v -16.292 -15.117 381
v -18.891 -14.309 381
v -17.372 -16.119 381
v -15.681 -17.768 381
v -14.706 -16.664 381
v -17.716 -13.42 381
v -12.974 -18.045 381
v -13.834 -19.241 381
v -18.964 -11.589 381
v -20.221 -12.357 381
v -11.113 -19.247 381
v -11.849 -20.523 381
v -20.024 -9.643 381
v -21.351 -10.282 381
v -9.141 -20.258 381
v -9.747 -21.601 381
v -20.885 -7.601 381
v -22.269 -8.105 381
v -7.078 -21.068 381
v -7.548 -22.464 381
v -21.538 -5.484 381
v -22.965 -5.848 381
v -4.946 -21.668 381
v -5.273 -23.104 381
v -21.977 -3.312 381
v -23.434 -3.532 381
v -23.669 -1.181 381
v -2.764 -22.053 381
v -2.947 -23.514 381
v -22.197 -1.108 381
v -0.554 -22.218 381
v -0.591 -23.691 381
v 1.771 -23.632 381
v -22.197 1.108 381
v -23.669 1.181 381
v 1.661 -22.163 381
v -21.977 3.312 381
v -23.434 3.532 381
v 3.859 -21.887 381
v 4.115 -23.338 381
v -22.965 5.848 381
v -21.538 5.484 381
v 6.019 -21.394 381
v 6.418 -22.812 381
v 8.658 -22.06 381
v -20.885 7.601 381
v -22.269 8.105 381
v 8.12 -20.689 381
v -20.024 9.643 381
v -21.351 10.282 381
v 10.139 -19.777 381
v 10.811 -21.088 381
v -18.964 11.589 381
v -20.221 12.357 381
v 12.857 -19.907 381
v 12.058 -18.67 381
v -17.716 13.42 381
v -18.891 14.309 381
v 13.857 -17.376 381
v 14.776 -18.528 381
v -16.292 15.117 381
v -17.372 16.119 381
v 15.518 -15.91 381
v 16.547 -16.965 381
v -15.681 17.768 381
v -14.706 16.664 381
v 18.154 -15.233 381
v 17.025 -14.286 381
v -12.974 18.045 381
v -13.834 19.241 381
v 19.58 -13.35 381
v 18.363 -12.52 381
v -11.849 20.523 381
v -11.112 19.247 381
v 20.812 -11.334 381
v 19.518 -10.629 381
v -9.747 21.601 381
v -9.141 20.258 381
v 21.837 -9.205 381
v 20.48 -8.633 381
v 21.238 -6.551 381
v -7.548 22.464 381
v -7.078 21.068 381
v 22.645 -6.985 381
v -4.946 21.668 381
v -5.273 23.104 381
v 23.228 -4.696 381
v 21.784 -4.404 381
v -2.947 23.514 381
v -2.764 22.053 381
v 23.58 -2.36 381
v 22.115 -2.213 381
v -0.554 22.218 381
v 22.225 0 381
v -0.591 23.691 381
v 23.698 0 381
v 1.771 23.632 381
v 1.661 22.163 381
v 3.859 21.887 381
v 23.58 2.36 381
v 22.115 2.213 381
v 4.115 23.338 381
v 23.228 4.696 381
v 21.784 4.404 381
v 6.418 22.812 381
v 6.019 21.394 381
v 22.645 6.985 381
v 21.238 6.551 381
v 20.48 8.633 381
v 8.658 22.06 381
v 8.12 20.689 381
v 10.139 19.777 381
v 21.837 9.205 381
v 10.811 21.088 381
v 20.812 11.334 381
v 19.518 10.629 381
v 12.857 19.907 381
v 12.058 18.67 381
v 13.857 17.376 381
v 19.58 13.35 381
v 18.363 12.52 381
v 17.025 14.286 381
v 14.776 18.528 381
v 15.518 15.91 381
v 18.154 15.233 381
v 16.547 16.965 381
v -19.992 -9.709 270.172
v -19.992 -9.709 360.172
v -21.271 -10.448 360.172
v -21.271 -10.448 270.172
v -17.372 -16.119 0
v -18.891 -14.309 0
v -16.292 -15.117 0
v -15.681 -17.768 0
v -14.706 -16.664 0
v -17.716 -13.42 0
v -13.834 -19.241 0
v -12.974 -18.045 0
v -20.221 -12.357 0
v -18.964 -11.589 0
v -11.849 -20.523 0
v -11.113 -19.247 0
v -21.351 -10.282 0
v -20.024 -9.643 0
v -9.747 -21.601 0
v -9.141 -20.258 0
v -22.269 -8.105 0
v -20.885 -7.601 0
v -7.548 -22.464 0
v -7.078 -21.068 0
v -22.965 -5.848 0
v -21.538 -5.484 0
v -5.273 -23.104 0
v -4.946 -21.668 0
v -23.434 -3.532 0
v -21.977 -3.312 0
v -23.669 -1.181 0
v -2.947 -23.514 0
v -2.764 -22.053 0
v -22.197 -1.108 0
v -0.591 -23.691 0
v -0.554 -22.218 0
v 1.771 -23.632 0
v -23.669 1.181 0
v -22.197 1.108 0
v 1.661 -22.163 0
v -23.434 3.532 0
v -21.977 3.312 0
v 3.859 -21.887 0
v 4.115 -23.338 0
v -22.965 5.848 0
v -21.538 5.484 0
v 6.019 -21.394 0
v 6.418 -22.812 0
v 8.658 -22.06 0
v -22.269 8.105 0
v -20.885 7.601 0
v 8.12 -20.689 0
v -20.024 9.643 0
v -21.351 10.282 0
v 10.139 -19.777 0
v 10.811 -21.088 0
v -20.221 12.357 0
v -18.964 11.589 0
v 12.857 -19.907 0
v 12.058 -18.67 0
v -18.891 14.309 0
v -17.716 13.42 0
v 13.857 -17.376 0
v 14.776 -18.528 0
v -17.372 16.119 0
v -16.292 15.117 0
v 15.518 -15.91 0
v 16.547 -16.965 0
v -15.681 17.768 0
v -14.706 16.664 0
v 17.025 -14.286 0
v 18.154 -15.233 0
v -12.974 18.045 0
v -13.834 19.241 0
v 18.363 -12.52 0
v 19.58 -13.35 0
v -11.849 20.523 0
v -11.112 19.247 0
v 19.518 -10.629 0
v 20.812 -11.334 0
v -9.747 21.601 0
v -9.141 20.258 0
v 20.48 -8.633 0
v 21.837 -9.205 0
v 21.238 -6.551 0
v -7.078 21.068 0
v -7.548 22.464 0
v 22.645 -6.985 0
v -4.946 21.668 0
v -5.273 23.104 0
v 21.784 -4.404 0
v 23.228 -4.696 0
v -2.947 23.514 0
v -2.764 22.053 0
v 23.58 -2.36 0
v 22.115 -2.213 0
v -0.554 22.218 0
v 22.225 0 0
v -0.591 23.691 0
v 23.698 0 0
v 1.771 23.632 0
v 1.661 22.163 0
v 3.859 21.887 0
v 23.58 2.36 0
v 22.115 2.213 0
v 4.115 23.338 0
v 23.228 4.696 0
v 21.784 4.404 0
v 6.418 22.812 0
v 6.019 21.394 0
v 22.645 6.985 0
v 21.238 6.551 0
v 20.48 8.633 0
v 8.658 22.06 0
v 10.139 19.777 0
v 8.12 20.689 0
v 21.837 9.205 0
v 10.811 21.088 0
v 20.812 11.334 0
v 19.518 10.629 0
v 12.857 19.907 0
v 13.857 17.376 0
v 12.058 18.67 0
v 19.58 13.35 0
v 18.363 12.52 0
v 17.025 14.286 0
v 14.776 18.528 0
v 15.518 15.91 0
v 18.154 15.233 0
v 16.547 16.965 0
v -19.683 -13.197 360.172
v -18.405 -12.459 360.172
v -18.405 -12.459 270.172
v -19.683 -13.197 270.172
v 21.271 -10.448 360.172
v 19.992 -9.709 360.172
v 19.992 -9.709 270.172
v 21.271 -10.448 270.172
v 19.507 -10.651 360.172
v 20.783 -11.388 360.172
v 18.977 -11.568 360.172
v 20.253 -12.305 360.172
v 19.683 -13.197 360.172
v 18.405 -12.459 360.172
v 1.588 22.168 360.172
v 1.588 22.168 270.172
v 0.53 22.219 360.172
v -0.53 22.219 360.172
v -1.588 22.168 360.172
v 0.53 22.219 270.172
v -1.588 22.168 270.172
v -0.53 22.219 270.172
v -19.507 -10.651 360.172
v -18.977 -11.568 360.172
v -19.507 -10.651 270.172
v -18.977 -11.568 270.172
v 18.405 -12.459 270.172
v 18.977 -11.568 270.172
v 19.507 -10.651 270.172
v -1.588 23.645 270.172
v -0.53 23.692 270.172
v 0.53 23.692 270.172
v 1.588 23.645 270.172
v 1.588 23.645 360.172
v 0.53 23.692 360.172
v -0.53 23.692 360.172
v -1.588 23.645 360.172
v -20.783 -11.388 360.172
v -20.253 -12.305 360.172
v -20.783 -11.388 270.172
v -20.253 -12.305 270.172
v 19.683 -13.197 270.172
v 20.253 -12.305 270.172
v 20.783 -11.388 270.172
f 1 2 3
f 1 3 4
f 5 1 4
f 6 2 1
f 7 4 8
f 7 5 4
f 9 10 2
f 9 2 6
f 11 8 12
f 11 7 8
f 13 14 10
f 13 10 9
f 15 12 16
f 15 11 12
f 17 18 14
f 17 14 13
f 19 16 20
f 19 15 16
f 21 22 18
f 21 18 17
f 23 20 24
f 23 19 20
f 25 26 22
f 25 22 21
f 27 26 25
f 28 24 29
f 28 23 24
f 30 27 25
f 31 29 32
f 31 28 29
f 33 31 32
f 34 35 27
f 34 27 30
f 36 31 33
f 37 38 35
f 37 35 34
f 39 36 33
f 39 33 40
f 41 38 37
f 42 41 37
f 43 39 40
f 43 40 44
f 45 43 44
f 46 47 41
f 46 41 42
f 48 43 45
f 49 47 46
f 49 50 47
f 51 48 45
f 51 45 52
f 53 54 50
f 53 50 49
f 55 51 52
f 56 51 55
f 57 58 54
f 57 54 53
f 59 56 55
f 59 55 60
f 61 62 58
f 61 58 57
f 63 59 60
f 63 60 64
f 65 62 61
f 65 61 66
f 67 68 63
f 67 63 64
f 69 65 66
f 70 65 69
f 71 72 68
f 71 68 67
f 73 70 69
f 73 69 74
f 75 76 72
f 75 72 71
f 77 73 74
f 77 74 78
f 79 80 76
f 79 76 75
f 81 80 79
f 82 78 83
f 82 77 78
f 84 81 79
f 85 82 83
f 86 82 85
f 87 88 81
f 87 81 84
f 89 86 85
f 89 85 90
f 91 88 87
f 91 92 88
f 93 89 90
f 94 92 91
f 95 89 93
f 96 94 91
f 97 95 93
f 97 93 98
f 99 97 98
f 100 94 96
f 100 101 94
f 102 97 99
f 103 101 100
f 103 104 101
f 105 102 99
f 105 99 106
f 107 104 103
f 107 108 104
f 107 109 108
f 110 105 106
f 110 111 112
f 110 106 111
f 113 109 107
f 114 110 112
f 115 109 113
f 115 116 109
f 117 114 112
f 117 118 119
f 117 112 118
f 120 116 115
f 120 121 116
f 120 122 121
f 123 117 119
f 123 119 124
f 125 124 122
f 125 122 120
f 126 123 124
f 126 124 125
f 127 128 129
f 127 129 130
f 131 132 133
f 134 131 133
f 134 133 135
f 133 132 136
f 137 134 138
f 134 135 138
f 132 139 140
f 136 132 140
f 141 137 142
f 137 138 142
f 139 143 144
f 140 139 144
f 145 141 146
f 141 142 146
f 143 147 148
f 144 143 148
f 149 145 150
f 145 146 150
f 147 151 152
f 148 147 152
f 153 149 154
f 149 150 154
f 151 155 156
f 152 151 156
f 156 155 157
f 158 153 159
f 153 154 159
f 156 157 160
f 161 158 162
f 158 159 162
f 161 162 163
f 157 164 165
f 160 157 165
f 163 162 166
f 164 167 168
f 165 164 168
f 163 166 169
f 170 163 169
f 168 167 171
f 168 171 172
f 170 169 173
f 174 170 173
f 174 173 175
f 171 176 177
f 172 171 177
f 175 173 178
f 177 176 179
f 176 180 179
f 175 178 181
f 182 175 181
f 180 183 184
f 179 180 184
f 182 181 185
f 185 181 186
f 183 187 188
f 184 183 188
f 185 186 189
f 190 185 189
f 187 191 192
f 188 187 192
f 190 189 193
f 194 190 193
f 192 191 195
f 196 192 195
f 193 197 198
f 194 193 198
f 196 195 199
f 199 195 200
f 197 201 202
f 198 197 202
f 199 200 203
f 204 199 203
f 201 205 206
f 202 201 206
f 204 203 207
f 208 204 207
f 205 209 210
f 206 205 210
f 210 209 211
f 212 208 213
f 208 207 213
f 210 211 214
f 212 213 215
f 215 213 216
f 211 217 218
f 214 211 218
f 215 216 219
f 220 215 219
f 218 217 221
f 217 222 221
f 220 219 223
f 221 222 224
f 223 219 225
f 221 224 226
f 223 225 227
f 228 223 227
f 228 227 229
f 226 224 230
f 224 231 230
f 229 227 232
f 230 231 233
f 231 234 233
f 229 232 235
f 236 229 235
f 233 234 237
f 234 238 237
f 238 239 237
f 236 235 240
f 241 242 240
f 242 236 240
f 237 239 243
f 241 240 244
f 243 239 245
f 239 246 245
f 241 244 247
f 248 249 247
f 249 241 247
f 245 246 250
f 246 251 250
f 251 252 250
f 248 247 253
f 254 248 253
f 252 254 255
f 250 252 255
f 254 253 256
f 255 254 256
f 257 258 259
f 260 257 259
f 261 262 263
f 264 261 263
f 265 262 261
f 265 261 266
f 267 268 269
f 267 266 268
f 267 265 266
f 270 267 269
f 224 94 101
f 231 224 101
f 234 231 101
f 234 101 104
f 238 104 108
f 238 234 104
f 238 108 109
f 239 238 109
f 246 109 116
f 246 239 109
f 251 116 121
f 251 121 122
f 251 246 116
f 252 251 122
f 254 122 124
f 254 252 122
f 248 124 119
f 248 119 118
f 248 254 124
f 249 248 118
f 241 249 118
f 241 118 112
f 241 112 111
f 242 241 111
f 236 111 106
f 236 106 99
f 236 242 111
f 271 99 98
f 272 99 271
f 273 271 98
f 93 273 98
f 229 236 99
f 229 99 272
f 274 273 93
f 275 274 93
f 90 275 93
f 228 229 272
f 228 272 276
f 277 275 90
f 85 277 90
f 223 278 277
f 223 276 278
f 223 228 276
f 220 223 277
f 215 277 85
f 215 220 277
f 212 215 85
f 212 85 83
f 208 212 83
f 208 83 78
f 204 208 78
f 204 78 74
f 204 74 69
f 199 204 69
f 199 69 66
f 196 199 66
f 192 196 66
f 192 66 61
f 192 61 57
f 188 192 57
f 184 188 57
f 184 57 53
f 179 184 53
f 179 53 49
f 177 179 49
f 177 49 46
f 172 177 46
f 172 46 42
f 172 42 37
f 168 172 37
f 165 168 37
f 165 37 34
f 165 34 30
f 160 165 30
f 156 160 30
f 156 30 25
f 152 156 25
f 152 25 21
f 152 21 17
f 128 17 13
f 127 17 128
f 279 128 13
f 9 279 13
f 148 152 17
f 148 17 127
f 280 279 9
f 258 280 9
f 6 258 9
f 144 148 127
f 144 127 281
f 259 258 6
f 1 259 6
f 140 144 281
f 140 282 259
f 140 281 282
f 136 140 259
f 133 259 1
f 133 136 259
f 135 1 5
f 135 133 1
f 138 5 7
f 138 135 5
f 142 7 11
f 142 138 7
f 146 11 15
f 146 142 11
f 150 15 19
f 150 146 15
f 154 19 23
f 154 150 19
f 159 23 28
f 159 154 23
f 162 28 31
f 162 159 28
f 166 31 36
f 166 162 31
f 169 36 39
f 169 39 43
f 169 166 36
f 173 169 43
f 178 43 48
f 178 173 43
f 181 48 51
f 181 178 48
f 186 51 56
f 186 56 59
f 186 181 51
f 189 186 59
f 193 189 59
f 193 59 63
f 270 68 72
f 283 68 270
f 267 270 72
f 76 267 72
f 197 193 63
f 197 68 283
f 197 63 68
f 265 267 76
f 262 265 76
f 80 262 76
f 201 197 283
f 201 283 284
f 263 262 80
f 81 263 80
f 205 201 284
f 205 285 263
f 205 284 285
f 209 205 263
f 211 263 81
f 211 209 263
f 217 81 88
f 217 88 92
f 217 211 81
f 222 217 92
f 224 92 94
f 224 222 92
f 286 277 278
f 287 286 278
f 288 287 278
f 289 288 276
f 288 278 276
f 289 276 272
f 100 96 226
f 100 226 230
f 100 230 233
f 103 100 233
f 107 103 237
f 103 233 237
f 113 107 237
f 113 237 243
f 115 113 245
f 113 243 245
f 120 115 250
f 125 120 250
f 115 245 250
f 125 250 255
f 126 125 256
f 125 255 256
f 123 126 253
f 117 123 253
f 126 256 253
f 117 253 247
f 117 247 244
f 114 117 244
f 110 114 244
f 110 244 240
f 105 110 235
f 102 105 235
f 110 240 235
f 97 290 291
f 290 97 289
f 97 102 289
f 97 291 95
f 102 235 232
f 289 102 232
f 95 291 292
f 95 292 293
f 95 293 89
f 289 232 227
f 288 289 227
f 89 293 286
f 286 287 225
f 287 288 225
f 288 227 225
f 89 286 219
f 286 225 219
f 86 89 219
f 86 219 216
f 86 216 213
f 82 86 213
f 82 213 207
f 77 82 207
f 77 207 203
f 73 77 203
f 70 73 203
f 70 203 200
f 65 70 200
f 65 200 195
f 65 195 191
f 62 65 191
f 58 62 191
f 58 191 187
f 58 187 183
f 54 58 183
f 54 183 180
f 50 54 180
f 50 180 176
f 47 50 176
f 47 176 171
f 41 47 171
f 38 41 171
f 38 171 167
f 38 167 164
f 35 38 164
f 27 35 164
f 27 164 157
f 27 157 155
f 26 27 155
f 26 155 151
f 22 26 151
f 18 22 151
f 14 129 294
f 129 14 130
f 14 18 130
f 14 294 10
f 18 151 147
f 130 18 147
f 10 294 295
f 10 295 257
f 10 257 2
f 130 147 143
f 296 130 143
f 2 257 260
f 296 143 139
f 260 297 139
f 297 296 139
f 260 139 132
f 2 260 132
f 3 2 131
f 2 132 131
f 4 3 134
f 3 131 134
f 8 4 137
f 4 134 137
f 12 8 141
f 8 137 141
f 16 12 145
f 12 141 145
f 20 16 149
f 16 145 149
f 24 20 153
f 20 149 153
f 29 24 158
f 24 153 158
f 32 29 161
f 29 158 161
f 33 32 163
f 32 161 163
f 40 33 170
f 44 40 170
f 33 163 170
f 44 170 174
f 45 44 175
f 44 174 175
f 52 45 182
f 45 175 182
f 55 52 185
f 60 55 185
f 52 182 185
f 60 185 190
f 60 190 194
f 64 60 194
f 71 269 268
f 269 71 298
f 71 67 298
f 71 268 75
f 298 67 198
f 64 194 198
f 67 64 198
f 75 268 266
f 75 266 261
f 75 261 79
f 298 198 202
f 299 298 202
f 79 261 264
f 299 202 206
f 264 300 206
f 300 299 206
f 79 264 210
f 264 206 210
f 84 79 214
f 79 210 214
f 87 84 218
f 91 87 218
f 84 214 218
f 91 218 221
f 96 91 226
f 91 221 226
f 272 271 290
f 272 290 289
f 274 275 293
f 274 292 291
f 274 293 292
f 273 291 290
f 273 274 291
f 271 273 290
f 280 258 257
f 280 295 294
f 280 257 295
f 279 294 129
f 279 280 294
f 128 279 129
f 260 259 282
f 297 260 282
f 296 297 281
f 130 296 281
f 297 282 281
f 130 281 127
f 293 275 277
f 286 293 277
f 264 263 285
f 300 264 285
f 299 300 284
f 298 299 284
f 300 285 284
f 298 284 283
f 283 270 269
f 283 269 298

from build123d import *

# Parameters (mm, degrees)
SKETCH1_R           = 23.6982
SKETCH1_R_2         = 22.225
BOSS_EXTRUDE1_DEPTH = 381
CUT_EXTRUDE2_START  = -28.631769
SKETCH3_W           = 3.175
SKETCH3_H           = 89.9999978
CUT_EXTRUDE2_DEPTH  = 1.529969
CIRPATTERN4_COUNT   = 3


with BuildPart() as part:
    # Sketch1 → Boss-Extrude1 (new body)
    with BuildSketch(Plane.XY):
        Circle(SKETCH1_R)
        Circle(SKETCH1_R_2, mode=Mode.SUBTRACT)
    extrude(amount=BOSS_EXTRUDE1_DEPTH)

    # Sketch3 → Cut-Extrude2 (cut)
    with BuildSketch(Plane(origin=(0, 50.8, 0), x_dir=(1, 0, 0), z_dir=(0, 1, 0)).offset(CUT_EXTRUDE2_START)):
        with Locations((0, -315.1720011)):
            Rectangle(SKETCH3_W, SKETCH3_H)
    cut_extrude2 = extrude(amount=CUT_EXTRUDE2_DEPTH, mode=Mode.SUBTRACT)

    # CirPattern4: Cut-Extrude2 ×3 about axis
    cirpattern4_axis = Axis((0, 0, 0), (0, 0, 1))
    for i in range(1, CIRPATTERN4_COUNT):
        add(cut_extrude2.rotate(cirpattern4_axis, i * 360 / CIRPATTERN4_COUNT), mode=Mode.SUBTRACT)


solid = part.part
